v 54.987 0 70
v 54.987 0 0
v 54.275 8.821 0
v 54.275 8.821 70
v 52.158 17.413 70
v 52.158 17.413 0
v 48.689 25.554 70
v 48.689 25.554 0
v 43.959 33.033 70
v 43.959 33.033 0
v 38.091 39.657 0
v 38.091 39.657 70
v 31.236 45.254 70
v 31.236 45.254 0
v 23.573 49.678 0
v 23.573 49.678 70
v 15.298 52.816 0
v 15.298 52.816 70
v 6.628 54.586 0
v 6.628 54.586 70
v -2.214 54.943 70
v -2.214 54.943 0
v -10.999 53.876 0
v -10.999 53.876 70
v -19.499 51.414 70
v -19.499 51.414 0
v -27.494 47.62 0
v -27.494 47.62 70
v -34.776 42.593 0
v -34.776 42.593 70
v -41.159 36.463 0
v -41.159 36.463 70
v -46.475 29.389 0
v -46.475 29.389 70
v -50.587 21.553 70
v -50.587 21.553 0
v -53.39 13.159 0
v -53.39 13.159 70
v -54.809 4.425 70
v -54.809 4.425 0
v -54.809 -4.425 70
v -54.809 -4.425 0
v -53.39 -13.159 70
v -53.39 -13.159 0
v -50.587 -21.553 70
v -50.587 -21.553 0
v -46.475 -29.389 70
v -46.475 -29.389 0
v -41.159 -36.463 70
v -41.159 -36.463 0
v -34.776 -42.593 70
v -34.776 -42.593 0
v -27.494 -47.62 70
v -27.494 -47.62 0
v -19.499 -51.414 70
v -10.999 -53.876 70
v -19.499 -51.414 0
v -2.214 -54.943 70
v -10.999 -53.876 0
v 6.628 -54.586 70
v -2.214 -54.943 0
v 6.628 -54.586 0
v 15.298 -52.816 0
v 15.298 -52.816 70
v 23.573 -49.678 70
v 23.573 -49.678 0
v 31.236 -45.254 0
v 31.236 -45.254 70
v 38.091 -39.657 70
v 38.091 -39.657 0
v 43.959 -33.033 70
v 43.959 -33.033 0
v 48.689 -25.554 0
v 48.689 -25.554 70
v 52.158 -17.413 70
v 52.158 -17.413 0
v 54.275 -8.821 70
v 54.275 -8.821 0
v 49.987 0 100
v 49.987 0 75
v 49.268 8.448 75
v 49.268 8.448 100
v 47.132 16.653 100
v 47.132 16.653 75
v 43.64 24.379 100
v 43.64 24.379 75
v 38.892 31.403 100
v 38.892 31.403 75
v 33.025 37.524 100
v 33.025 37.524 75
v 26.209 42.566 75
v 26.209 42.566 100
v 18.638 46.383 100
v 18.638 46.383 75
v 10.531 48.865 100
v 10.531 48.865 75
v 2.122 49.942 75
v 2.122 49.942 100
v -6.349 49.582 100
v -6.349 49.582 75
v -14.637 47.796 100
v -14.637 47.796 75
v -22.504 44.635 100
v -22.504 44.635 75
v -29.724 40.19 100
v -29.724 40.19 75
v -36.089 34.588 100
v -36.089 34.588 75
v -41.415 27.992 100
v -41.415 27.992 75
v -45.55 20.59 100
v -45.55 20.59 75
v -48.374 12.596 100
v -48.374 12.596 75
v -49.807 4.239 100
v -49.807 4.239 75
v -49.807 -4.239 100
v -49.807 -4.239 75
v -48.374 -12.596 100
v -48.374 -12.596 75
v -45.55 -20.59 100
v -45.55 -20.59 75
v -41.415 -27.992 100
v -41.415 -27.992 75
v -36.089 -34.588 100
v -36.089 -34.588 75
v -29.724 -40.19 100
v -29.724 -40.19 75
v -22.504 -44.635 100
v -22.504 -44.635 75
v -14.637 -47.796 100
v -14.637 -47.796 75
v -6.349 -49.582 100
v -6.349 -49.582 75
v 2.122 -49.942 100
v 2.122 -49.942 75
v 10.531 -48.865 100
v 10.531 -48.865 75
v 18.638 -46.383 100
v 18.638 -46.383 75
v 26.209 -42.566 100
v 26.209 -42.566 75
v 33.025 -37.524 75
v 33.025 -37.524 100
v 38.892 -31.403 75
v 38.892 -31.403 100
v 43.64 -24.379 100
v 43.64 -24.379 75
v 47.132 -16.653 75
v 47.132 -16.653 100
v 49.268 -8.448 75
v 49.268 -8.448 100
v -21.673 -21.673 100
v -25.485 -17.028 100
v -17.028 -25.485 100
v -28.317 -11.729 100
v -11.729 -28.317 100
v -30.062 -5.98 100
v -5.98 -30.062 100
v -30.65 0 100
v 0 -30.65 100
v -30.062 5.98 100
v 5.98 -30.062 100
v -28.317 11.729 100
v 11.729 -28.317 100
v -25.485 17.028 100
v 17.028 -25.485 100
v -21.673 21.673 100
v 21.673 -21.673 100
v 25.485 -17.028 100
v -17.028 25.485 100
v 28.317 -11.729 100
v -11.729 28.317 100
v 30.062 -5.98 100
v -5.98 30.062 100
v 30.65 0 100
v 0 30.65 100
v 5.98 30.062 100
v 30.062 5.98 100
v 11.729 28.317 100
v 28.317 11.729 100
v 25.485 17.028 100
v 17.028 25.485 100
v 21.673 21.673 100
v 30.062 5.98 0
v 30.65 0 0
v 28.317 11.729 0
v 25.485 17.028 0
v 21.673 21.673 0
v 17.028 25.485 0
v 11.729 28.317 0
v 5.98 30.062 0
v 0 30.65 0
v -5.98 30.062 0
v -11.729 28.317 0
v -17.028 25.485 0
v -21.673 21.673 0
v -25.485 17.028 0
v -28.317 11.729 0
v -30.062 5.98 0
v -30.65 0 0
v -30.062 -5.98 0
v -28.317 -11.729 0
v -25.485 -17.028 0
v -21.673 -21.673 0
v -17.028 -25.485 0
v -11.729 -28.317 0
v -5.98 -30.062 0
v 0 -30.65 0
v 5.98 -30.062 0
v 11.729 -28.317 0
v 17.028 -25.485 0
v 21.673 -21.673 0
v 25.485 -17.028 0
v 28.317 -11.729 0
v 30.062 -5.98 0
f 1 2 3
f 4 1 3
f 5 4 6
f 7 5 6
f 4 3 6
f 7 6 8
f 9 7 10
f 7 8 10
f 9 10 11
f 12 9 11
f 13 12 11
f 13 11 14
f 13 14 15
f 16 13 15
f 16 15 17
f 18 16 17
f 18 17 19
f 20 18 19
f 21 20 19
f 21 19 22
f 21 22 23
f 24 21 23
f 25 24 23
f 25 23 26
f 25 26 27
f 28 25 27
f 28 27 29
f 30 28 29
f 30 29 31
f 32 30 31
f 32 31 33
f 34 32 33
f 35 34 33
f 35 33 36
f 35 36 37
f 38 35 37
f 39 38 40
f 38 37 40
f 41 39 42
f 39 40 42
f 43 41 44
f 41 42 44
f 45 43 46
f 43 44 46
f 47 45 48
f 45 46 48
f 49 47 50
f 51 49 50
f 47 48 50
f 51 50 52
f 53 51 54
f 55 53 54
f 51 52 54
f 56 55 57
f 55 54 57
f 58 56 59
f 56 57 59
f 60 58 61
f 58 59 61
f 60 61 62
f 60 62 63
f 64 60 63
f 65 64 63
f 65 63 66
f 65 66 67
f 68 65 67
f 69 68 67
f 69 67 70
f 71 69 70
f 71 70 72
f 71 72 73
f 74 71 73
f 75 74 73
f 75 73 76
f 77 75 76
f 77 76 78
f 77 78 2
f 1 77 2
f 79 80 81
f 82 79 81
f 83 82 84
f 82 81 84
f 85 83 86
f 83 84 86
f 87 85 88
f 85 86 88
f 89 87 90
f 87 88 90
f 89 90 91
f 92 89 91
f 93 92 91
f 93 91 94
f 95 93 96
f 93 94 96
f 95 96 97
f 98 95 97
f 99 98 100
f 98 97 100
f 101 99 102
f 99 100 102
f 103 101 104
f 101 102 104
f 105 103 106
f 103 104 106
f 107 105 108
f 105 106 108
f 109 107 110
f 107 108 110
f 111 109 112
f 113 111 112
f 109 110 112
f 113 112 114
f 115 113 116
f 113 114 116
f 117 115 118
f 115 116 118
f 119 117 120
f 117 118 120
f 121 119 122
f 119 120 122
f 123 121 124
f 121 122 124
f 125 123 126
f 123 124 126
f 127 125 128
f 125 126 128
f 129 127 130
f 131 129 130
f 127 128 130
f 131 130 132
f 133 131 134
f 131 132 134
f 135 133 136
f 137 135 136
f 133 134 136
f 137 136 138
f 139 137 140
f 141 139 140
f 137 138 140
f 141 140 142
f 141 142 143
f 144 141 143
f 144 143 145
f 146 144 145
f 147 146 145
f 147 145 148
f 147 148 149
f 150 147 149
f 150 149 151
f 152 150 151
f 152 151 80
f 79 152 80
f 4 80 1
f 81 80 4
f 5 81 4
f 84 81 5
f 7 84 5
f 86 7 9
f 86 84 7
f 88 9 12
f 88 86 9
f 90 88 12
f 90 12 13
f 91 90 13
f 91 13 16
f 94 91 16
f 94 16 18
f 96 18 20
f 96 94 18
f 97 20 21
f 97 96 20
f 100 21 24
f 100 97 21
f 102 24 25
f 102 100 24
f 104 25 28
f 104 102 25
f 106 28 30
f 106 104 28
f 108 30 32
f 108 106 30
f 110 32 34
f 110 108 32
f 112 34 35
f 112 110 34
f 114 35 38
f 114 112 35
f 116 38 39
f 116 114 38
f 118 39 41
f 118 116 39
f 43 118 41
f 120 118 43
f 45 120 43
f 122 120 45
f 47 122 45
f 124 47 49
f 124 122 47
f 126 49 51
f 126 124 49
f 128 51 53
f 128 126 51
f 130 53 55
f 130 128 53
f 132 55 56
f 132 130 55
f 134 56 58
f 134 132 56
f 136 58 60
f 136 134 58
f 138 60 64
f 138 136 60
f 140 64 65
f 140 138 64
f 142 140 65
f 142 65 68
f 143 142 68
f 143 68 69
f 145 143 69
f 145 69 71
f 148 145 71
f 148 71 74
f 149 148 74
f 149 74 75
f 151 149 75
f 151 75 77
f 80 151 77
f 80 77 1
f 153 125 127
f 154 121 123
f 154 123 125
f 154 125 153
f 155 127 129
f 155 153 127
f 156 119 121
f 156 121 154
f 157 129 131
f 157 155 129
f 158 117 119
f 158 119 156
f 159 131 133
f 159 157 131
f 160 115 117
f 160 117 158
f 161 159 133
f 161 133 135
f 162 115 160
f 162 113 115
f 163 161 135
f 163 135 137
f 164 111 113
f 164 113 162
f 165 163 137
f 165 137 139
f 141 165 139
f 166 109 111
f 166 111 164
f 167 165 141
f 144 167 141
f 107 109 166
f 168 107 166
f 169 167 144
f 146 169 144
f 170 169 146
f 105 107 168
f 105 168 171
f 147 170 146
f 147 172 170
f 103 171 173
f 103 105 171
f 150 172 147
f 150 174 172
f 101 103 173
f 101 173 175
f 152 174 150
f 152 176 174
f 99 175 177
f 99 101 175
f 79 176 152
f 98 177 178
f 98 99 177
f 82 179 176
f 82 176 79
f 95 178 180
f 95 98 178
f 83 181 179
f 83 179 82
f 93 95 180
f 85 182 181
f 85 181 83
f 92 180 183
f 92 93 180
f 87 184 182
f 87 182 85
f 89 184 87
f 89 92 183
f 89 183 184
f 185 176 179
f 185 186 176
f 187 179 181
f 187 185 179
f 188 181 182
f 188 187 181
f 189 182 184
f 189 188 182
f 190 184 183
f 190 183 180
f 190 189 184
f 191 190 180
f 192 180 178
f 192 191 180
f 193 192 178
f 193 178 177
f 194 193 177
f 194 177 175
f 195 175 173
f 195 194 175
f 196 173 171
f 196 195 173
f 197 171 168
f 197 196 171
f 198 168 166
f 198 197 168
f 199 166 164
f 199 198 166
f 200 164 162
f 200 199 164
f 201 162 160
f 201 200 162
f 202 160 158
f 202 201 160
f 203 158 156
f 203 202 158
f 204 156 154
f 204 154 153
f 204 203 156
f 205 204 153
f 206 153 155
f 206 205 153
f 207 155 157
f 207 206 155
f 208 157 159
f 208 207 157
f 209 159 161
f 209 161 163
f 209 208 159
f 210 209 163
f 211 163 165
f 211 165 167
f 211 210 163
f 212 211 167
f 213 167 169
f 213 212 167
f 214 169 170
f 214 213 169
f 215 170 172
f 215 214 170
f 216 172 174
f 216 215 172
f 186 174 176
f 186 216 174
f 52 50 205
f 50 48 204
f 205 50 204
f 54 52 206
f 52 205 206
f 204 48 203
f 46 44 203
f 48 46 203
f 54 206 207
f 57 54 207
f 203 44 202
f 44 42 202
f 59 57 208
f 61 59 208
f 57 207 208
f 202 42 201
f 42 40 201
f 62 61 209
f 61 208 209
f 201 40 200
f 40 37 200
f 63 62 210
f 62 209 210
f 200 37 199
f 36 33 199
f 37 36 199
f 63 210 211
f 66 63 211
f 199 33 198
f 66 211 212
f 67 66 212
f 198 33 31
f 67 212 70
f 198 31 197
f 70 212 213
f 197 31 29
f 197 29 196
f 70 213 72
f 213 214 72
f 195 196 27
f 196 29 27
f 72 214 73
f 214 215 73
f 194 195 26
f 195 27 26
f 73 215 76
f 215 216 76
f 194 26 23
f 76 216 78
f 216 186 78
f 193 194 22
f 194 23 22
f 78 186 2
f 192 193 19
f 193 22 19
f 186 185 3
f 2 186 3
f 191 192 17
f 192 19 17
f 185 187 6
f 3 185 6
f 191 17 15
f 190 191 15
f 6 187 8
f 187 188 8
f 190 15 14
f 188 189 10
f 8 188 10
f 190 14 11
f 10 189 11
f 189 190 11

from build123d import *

# Parameters (mm, degrees)
F0_R     = 54.9873504391
F0_R_2   = 30.6504677255
F1_DEPTH = 25
F2_DEPTH = 50
F3_SIZE  = 5
F4_DEPTH = 25


with BuildPart() as f1:
    # F0 (on Top) → F1 (new body)
    with BuildSketch(Plane.XY):
        Circle(F0_R)
        Circle(F0_R_2, mode=Mode.SUBTRACT)
    extrude(amount=F1_DEPTH)

    # F2 (add): a face of the model
    f2_faces = [f1.faces().sort_by_distance(p)[0] for p in [
        (-53.4320733041, 0, 25),
    ]]
    extrude(f2_faces, amount=F2_DEPTH)

    # F3
    f3_edges = [f1.edges().sort_by_distance(p)[0] for p in [
        (-54.98735, 0, 75),
    ]]
    chamfer(f3_edges, length=F3_SIZE)

    # F4 (add): a face of the model
    f4_faces = [f1.faces().sort_by_distance(p)[0] for p in [
        (-48.5734946603, 0, 75),
    ]]
    extrude(f4_faces, amount=F4_DEPTH)


solid = f1.part
